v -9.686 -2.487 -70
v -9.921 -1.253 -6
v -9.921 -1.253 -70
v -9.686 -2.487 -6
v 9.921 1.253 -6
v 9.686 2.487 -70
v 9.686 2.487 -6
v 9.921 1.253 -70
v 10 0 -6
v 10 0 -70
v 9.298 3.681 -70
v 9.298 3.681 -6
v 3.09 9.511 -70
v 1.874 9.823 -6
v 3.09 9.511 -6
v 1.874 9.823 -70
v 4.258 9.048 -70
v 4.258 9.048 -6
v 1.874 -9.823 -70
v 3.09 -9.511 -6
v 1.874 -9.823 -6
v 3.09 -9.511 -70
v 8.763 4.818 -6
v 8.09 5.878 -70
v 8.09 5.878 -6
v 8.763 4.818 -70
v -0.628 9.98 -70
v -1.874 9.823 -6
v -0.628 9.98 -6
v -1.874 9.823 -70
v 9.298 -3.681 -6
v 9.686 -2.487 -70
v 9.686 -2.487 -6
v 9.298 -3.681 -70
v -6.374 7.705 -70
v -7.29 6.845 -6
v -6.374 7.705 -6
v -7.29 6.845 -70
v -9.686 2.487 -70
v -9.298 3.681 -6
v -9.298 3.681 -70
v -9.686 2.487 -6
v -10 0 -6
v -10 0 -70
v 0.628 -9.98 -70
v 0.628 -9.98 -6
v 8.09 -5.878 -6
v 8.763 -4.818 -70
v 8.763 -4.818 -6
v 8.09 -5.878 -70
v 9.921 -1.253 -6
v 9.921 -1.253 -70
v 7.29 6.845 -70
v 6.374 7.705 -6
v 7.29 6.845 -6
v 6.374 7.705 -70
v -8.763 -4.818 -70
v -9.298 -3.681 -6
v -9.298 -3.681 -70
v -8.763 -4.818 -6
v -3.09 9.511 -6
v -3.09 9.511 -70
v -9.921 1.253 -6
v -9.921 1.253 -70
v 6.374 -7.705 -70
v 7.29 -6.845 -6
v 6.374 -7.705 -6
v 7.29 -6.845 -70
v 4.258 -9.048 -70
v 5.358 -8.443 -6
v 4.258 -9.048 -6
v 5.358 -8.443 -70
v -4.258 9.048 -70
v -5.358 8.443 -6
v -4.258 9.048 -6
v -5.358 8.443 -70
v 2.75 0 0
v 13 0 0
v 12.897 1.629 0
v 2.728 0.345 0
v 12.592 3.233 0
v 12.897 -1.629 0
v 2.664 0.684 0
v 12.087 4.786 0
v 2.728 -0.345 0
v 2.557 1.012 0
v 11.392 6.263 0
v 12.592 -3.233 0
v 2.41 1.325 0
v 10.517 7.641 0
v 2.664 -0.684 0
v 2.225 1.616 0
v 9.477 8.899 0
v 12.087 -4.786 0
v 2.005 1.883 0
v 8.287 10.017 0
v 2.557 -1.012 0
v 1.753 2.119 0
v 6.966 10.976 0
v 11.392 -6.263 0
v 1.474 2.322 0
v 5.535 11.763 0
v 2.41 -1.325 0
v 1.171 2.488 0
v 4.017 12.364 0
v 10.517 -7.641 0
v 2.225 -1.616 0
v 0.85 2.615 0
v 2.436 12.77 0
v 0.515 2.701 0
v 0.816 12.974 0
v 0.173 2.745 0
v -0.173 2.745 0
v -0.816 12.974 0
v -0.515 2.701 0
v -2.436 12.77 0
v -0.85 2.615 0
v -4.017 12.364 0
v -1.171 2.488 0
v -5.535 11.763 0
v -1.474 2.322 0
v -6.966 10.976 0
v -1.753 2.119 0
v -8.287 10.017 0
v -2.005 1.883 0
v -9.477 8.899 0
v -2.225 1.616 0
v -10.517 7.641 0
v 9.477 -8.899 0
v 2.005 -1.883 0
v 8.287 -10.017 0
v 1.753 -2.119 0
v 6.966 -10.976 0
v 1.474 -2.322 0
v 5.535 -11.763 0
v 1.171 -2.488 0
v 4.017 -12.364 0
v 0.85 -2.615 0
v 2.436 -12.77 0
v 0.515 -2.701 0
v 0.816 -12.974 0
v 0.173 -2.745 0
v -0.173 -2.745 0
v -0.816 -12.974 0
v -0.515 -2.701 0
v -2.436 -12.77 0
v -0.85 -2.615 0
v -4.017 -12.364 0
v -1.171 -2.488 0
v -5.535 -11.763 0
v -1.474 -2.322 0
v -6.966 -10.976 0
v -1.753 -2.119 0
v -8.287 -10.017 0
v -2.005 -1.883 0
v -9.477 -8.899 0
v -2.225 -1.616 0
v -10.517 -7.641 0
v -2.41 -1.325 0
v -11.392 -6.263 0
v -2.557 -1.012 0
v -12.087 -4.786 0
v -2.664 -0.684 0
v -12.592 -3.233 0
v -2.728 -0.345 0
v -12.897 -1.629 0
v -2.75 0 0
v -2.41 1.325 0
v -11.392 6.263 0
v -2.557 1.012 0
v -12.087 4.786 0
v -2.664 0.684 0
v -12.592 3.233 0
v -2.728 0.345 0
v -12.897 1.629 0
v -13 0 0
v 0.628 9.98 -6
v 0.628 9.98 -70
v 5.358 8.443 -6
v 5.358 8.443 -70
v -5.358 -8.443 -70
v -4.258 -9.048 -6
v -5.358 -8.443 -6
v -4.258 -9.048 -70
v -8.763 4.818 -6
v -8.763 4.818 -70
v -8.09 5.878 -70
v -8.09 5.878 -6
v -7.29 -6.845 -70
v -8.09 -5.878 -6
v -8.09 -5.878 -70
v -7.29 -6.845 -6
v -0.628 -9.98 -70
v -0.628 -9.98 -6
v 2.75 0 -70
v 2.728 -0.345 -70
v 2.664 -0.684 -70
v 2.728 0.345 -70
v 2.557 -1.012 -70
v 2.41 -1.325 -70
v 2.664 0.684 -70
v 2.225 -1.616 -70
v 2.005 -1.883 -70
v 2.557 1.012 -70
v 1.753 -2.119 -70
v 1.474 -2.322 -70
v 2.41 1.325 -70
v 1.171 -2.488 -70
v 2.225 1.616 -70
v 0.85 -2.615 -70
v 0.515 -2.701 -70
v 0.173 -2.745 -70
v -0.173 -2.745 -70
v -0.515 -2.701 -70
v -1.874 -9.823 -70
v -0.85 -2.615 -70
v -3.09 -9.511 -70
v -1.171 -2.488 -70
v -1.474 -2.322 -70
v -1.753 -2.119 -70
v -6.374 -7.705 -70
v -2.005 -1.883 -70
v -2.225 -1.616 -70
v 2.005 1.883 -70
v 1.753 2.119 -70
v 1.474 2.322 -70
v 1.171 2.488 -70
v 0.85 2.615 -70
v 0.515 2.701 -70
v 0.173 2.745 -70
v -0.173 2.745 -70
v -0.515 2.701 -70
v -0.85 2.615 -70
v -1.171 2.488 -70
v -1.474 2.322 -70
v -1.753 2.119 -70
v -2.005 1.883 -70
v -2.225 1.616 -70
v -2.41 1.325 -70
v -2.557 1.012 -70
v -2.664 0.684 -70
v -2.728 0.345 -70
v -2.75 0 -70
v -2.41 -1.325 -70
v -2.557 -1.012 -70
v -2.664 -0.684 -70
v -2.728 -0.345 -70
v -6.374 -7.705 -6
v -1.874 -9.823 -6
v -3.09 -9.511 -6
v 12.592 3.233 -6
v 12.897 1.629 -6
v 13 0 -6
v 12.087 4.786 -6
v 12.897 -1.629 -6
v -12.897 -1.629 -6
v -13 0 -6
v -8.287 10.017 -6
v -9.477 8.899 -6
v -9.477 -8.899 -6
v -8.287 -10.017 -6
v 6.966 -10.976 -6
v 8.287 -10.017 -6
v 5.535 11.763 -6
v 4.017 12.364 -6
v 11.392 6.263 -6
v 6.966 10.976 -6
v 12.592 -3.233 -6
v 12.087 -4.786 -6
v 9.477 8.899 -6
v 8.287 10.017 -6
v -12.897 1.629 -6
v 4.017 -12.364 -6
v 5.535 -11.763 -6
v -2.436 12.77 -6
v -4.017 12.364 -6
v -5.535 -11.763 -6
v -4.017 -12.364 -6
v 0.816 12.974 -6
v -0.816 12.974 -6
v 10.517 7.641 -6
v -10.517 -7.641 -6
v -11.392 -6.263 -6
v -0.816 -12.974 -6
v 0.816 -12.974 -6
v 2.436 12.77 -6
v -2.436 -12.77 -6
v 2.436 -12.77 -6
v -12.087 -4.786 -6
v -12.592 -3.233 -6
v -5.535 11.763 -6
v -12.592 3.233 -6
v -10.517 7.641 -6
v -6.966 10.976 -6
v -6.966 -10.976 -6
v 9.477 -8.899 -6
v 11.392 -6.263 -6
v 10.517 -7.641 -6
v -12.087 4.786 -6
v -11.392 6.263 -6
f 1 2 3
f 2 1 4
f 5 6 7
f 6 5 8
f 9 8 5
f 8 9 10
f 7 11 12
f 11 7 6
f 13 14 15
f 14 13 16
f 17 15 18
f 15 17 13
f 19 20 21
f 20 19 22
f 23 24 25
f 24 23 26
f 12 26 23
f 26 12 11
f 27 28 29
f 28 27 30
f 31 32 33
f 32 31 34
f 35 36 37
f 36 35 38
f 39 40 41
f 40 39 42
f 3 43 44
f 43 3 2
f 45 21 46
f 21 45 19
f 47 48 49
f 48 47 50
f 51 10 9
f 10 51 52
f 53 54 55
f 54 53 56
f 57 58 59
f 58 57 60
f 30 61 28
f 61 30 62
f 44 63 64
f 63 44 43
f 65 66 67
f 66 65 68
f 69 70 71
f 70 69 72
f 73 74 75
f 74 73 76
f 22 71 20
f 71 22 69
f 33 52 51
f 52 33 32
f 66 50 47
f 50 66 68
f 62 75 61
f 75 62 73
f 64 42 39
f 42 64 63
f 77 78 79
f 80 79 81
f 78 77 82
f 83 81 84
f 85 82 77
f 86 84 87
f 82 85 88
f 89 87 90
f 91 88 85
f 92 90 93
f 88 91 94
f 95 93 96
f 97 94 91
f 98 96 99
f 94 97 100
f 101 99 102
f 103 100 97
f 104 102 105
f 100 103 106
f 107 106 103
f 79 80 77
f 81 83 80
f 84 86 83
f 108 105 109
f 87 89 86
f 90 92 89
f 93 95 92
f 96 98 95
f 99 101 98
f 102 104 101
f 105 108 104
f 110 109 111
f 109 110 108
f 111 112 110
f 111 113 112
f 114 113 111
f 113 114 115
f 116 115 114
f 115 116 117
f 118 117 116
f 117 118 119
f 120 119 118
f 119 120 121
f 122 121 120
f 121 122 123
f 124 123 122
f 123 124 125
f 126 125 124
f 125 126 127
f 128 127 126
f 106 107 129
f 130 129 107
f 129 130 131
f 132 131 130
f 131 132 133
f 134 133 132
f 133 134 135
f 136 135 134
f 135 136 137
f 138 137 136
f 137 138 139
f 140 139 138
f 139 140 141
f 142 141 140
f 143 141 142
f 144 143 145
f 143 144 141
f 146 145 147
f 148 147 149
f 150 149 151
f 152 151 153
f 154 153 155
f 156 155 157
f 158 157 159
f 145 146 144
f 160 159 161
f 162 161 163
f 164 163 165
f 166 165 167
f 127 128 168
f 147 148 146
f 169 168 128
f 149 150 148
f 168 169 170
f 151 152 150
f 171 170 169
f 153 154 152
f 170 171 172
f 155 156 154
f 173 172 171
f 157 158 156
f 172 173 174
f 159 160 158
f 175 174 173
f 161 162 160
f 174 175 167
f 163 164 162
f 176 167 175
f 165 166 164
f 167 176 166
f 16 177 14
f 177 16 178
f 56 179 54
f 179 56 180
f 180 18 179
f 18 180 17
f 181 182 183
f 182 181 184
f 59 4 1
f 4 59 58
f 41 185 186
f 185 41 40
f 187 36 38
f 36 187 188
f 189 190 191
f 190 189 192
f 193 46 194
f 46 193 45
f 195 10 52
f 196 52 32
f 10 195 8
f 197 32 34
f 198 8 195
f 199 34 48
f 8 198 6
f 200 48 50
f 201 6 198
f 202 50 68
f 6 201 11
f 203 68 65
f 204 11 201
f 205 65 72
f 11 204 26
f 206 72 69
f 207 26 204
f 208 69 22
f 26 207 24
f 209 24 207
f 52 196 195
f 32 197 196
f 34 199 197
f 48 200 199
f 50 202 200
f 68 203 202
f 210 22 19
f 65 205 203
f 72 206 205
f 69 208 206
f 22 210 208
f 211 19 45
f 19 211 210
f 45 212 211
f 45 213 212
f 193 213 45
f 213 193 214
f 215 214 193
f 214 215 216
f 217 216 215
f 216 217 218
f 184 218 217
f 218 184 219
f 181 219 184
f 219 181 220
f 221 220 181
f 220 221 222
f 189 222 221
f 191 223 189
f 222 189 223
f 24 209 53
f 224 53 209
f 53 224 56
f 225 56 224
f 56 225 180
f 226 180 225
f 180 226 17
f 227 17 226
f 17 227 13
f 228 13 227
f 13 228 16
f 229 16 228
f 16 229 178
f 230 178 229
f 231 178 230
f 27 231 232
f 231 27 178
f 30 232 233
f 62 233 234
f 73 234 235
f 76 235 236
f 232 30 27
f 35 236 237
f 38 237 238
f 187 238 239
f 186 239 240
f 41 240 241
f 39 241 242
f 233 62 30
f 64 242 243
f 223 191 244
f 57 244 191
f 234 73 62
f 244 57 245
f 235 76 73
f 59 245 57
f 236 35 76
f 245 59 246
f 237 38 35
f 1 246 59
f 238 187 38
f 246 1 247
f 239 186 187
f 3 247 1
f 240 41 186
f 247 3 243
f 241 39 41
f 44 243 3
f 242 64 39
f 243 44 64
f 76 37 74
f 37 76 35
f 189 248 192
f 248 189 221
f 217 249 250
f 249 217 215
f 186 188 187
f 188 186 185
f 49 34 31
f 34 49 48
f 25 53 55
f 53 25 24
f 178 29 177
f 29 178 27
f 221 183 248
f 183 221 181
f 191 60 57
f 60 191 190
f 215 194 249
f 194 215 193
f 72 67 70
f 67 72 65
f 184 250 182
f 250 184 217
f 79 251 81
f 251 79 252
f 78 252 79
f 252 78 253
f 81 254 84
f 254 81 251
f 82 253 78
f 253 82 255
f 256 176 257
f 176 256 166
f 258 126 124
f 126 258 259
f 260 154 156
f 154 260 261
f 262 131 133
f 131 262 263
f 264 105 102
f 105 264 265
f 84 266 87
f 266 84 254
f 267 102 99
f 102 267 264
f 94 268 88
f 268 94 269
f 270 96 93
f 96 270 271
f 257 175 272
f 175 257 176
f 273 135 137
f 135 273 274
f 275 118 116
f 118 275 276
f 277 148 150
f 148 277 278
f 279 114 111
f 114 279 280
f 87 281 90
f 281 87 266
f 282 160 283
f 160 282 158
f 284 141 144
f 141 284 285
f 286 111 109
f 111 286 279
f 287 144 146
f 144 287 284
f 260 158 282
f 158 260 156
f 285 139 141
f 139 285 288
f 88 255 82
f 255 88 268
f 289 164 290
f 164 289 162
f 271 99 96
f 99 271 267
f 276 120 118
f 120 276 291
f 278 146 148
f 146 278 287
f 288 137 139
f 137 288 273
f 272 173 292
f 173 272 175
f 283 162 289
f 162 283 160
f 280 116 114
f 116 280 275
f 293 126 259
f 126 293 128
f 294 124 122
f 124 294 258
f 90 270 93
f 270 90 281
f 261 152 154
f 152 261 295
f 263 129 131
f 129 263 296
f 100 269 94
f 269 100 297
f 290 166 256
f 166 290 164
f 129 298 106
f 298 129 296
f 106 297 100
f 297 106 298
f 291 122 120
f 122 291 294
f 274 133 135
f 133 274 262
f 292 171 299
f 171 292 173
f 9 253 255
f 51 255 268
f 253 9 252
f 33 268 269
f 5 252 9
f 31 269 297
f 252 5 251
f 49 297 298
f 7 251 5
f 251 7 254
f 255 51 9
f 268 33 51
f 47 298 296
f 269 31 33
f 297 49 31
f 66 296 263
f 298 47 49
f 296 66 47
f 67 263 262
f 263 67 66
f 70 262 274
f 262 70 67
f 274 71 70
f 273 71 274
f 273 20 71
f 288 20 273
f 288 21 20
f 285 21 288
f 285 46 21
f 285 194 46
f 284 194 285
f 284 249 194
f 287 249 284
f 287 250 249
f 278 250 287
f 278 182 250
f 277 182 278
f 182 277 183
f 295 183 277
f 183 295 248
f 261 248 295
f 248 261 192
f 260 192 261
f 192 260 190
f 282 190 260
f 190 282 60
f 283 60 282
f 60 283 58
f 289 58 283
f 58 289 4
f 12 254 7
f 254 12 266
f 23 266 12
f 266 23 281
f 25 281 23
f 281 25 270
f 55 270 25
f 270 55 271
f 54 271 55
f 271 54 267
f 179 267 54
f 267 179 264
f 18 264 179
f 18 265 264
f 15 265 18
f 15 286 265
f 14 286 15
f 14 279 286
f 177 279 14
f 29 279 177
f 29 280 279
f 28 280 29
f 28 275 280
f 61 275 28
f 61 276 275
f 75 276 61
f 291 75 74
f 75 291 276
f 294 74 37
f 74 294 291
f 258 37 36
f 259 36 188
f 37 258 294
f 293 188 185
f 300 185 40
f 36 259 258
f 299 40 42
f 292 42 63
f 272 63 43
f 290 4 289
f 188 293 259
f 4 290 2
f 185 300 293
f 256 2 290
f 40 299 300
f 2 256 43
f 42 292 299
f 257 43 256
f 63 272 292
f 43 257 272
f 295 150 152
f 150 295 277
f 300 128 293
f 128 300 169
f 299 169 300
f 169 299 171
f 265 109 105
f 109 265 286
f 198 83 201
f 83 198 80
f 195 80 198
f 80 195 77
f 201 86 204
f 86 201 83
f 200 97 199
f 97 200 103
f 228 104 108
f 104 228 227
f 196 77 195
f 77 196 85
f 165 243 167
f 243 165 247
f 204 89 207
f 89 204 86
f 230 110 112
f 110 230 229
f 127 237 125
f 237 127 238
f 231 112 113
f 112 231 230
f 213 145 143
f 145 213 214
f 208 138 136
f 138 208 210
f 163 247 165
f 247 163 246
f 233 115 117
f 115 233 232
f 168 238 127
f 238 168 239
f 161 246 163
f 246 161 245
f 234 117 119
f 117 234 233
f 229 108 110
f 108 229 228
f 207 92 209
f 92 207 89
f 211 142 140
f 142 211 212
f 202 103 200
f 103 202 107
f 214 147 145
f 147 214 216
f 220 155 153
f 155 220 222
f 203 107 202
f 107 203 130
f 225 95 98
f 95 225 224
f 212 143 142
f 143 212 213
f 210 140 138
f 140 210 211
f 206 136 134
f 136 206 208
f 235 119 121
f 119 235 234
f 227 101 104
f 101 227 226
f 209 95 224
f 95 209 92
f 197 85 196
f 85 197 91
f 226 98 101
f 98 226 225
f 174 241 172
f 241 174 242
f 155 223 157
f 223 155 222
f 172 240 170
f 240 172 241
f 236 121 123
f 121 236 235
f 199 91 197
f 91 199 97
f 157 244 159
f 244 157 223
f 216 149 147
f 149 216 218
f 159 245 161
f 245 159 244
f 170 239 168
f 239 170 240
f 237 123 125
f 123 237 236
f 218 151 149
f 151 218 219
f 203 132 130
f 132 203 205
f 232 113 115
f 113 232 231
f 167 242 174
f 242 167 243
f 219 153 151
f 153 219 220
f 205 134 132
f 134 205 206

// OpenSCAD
$fn = 50;


difference() {
	union() {
		translate(v = [0, 0, -70.0000000000]) {
			cylinder(h = 70, r = 10.0000000000);
		}
		translate(v = [0, 0, -6.0000000000]) {
			cylinder(h = 6, r = 13.0000000000);
		}
	}
	union() {
		#translate(v = [0, 0, -70]) {
			cylinder(h = 70, r = 2.7500000000);
		}
	}
}
